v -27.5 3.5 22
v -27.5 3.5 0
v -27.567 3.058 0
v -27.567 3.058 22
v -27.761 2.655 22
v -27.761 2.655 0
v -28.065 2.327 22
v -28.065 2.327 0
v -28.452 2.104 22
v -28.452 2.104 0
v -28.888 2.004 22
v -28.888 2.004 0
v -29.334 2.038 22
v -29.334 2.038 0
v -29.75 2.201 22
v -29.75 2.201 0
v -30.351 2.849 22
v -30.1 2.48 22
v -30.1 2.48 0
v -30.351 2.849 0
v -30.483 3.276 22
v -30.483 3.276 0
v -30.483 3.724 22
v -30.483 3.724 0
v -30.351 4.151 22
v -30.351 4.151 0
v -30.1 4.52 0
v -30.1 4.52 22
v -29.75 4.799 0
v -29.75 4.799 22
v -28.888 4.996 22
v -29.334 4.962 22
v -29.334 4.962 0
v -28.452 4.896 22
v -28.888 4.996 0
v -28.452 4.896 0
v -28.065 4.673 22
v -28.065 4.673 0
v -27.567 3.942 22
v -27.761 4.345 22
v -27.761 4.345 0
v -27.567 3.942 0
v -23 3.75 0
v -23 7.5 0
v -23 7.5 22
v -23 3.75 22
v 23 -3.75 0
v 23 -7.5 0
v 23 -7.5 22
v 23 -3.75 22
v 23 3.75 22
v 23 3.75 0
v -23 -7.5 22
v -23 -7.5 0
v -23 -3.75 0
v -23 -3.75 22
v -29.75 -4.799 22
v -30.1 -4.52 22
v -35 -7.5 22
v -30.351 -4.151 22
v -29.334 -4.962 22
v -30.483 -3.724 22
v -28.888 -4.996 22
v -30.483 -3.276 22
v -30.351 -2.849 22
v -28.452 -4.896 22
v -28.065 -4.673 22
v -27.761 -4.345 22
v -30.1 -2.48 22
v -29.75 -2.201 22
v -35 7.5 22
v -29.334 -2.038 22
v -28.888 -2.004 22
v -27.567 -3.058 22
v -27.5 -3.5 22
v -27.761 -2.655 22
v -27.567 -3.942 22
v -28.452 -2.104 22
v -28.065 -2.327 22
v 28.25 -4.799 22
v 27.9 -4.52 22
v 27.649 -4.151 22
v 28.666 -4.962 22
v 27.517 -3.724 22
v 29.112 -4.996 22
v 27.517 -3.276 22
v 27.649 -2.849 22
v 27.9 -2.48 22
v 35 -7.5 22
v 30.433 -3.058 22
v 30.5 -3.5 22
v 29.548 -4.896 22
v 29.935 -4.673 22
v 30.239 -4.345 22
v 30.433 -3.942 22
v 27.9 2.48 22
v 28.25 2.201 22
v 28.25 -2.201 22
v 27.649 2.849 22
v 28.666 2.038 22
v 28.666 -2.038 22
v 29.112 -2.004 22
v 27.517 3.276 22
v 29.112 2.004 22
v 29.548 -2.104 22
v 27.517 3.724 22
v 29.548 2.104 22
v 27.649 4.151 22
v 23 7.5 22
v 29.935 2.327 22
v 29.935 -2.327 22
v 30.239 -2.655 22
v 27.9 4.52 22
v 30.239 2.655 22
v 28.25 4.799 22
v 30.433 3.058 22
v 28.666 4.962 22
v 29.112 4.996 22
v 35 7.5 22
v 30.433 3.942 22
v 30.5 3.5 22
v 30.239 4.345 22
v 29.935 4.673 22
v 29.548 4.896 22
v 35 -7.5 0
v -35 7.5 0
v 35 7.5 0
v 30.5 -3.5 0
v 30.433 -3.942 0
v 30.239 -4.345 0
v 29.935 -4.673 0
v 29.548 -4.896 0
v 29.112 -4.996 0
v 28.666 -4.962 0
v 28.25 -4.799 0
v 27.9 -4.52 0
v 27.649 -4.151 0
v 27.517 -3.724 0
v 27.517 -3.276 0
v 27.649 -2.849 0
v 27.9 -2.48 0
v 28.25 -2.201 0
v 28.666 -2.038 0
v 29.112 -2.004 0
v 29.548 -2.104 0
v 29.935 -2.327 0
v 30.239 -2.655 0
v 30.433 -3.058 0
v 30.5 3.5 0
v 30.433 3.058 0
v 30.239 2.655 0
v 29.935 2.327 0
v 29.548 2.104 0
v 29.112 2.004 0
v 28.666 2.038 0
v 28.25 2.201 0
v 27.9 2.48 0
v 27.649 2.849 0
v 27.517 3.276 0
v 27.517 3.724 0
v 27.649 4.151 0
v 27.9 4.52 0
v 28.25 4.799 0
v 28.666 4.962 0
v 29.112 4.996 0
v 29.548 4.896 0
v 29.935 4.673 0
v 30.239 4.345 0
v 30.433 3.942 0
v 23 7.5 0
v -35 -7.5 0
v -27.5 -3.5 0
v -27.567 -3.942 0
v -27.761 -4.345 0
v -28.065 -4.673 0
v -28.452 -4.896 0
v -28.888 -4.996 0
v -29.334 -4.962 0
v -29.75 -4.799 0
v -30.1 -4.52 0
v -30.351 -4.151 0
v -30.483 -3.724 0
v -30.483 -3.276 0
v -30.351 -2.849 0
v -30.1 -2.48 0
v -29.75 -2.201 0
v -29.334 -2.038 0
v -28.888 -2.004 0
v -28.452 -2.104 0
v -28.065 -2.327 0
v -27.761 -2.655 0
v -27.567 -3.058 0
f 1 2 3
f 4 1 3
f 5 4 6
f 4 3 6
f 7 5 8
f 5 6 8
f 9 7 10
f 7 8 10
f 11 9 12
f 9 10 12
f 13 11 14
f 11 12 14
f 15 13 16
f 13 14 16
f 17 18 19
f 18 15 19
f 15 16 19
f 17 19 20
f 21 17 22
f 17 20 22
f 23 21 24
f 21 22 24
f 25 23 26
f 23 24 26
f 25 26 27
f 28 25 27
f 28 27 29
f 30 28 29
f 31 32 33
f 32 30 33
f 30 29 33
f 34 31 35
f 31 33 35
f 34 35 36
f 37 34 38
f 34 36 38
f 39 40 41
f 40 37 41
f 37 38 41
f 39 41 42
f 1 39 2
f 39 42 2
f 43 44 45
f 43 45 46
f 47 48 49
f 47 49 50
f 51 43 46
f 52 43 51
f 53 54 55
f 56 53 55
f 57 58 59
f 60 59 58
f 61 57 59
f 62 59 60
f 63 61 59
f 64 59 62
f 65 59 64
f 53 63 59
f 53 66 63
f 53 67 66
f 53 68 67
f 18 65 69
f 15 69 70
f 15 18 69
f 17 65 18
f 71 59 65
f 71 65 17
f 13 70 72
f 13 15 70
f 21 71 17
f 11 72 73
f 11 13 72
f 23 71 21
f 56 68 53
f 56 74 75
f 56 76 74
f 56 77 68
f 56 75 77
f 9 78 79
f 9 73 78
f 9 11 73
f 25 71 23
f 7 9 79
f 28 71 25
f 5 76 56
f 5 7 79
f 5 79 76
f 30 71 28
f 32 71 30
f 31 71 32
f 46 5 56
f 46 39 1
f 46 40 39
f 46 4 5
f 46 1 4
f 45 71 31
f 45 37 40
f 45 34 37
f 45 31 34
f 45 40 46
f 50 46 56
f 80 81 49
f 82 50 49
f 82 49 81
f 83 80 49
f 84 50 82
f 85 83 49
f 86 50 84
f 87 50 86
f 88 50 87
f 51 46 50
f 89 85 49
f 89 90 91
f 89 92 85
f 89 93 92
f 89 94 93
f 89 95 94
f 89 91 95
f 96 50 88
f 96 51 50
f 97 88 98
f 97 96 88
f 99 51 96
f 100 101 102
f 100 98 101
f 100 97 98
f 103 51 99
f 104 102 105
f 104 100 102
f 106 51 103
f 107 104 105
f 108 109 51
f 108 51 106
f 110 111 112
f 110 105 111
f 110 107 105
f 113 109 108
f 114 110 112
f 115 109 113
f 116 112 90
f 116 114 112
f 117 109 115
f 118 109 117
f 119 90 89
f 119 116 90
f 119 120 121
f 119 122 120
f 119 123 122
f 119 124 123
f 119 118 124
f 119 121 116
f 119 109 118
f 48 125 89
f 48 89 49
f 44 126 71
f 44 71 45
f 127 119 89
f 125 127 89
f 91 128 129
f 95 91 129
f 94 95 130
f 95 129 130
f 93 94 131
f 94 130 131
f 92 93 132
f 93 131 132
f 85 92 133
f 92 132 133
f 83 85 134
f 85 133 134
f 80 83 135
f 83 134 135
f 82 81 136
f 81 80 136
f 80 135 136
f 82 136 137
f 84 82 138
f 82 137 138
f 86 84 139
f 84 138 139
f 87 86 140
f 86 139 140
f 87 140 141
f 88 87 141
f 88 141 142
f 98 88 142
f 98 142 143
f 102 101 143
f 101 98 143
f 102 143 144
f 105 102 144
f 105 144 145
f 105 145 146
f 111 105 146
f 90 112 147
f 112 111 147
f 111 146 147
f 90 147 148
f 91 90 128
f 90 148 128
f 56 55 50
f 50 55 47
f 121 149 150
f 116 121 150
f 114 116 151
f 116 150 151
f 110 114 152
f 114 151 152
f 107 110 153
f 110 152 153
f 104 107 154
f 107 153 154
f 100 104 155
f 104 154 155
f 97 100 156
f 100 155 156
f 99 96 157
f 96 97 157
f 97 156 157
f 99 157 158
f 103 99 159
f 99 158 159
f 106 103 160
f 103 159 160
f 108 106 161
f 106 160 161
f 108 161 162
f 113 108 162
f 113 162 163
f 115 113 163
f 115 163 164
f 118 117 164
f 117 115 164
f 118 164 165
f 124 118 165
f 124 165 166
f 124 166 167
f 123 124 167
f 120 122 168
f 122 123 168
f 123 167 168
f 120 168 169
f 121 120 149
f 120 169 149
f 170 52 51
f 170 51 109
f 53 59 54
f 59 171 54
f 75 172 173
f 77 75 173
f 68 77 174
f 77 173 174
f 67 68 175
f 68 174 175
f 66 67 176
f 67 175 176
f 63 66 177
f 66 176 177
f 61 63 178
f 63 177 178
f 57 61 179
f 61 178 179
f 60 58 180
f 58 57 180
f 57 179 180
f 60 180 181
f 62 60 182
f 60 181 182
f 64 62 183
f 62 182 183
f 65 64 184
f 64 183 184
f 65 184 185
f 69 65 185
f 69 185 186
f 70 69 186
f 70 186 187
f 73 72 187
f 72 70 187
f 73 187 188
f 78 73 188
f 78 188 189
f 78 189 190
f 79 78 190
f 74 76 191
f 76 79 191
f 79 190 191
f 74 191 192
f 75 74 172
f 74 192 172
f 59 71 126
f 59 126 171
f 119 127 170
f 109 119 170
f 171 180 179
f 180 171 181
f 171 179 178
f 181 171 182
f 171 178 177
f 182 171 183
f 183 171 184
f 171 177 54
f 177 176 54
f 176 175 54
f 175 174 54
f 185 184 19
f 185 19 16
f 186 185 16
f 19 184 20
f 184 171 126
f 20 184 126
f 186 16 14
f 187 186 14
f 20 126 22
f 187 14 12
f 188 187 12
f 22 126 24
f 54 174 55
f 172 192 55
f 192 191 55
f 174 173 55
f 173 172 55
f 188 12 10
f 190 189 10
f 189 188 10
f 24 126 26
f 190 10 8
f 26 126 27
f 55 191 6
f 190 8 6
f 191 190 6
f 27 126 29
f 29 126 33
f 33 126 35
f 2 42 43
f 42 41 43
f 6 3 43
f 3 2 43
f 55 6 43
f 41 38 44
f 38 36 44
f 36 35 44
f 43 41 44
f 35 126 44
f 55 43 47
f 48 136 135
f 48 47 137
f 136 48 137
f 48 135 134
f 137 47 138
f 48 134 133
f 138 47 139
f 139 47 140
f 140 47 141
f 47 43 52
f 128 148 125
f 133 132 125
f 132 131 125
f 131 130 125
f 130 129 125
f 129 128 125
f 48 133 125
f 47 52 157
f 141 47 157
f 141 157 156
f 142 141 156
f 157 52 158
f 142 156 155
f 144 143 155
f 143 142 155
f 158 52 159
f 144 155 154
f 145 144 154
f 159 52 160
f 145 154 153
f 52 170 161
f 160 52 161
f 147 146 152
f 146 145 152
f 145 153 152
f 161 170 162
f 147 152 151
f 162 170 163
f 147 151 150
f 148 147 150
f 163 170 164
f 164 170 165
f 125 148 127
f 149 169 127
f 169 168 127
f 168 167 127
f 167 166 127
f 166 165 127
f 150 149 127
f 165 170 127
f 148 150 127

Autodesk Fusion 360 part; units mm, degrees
sketch "Sketch3" plane through (0, 0, 0) normal (0, 0, 1) x (1, 0, 0)
  line L0 (-35, 0) -> (35, 0) construction
  line L1 (-35, 7.5) -> (-35, -7.5)
  line L2 (35, 7.5) -> (35, -7.5)
  line L3 (-23, -3.75) -> (23, -3.75)
  line L4 (-23, 3.75) -> (23, 3.75)
  line L5 (0, 3.75) -> (0, -3.75) construction
  line L6 (-35, -7.5) -> (-23, -7.5)
  line L7 (35, -7.5) -> (23, -7.5)
  line L8 (-35, 7.5) -> (-23, 7.5)
  line L9 (-23, 3.75) -> (23, 3.75)
  line L10 (35, 7.5) -> (23, 7.5)
  circle A0 centre (-29, 3.5) radius 1.5
  circle A1 centre (-29, -3.5) radius 1.5
  circle A2 centre (29, 3.5) radius 1.5
  circle A3 centre (29, -3.5) radius 1.5
  line L11 (-29, 3.5) -> (-29, -3.5) construction
  line L12 (29, 3.5) -> (29, -3.5) construction
  line L13 (29, -3.5) -> (-29, -3.5) construction
  line L14 (-29, -3.5) -> (29, 3.5) construction
  line L15 (23, -7.5) -> (23, -3.75)
  line L16 (23, 3.75) -> (23, 7.5)
  line L17 (-23, 7.5) -> (-23, 3.75)
  line L18 (-23, -7.5) -> (-23, -3.75)
  dimension "d9" = 70
  dimension "d10" = 15
  dimension "d13" = 7.5
  dimension "d17" = 3
  dimension "d18" = 3
  dimension "d19" = 3
  dimension "d20" = 3
  dimension "d22" = 7
  dimension "d23" = 7
  dimension "d26" = 6
  dimension "d27" = 12
extrude "Extrude2" add sketch "Sketch3" along normal blind 22
